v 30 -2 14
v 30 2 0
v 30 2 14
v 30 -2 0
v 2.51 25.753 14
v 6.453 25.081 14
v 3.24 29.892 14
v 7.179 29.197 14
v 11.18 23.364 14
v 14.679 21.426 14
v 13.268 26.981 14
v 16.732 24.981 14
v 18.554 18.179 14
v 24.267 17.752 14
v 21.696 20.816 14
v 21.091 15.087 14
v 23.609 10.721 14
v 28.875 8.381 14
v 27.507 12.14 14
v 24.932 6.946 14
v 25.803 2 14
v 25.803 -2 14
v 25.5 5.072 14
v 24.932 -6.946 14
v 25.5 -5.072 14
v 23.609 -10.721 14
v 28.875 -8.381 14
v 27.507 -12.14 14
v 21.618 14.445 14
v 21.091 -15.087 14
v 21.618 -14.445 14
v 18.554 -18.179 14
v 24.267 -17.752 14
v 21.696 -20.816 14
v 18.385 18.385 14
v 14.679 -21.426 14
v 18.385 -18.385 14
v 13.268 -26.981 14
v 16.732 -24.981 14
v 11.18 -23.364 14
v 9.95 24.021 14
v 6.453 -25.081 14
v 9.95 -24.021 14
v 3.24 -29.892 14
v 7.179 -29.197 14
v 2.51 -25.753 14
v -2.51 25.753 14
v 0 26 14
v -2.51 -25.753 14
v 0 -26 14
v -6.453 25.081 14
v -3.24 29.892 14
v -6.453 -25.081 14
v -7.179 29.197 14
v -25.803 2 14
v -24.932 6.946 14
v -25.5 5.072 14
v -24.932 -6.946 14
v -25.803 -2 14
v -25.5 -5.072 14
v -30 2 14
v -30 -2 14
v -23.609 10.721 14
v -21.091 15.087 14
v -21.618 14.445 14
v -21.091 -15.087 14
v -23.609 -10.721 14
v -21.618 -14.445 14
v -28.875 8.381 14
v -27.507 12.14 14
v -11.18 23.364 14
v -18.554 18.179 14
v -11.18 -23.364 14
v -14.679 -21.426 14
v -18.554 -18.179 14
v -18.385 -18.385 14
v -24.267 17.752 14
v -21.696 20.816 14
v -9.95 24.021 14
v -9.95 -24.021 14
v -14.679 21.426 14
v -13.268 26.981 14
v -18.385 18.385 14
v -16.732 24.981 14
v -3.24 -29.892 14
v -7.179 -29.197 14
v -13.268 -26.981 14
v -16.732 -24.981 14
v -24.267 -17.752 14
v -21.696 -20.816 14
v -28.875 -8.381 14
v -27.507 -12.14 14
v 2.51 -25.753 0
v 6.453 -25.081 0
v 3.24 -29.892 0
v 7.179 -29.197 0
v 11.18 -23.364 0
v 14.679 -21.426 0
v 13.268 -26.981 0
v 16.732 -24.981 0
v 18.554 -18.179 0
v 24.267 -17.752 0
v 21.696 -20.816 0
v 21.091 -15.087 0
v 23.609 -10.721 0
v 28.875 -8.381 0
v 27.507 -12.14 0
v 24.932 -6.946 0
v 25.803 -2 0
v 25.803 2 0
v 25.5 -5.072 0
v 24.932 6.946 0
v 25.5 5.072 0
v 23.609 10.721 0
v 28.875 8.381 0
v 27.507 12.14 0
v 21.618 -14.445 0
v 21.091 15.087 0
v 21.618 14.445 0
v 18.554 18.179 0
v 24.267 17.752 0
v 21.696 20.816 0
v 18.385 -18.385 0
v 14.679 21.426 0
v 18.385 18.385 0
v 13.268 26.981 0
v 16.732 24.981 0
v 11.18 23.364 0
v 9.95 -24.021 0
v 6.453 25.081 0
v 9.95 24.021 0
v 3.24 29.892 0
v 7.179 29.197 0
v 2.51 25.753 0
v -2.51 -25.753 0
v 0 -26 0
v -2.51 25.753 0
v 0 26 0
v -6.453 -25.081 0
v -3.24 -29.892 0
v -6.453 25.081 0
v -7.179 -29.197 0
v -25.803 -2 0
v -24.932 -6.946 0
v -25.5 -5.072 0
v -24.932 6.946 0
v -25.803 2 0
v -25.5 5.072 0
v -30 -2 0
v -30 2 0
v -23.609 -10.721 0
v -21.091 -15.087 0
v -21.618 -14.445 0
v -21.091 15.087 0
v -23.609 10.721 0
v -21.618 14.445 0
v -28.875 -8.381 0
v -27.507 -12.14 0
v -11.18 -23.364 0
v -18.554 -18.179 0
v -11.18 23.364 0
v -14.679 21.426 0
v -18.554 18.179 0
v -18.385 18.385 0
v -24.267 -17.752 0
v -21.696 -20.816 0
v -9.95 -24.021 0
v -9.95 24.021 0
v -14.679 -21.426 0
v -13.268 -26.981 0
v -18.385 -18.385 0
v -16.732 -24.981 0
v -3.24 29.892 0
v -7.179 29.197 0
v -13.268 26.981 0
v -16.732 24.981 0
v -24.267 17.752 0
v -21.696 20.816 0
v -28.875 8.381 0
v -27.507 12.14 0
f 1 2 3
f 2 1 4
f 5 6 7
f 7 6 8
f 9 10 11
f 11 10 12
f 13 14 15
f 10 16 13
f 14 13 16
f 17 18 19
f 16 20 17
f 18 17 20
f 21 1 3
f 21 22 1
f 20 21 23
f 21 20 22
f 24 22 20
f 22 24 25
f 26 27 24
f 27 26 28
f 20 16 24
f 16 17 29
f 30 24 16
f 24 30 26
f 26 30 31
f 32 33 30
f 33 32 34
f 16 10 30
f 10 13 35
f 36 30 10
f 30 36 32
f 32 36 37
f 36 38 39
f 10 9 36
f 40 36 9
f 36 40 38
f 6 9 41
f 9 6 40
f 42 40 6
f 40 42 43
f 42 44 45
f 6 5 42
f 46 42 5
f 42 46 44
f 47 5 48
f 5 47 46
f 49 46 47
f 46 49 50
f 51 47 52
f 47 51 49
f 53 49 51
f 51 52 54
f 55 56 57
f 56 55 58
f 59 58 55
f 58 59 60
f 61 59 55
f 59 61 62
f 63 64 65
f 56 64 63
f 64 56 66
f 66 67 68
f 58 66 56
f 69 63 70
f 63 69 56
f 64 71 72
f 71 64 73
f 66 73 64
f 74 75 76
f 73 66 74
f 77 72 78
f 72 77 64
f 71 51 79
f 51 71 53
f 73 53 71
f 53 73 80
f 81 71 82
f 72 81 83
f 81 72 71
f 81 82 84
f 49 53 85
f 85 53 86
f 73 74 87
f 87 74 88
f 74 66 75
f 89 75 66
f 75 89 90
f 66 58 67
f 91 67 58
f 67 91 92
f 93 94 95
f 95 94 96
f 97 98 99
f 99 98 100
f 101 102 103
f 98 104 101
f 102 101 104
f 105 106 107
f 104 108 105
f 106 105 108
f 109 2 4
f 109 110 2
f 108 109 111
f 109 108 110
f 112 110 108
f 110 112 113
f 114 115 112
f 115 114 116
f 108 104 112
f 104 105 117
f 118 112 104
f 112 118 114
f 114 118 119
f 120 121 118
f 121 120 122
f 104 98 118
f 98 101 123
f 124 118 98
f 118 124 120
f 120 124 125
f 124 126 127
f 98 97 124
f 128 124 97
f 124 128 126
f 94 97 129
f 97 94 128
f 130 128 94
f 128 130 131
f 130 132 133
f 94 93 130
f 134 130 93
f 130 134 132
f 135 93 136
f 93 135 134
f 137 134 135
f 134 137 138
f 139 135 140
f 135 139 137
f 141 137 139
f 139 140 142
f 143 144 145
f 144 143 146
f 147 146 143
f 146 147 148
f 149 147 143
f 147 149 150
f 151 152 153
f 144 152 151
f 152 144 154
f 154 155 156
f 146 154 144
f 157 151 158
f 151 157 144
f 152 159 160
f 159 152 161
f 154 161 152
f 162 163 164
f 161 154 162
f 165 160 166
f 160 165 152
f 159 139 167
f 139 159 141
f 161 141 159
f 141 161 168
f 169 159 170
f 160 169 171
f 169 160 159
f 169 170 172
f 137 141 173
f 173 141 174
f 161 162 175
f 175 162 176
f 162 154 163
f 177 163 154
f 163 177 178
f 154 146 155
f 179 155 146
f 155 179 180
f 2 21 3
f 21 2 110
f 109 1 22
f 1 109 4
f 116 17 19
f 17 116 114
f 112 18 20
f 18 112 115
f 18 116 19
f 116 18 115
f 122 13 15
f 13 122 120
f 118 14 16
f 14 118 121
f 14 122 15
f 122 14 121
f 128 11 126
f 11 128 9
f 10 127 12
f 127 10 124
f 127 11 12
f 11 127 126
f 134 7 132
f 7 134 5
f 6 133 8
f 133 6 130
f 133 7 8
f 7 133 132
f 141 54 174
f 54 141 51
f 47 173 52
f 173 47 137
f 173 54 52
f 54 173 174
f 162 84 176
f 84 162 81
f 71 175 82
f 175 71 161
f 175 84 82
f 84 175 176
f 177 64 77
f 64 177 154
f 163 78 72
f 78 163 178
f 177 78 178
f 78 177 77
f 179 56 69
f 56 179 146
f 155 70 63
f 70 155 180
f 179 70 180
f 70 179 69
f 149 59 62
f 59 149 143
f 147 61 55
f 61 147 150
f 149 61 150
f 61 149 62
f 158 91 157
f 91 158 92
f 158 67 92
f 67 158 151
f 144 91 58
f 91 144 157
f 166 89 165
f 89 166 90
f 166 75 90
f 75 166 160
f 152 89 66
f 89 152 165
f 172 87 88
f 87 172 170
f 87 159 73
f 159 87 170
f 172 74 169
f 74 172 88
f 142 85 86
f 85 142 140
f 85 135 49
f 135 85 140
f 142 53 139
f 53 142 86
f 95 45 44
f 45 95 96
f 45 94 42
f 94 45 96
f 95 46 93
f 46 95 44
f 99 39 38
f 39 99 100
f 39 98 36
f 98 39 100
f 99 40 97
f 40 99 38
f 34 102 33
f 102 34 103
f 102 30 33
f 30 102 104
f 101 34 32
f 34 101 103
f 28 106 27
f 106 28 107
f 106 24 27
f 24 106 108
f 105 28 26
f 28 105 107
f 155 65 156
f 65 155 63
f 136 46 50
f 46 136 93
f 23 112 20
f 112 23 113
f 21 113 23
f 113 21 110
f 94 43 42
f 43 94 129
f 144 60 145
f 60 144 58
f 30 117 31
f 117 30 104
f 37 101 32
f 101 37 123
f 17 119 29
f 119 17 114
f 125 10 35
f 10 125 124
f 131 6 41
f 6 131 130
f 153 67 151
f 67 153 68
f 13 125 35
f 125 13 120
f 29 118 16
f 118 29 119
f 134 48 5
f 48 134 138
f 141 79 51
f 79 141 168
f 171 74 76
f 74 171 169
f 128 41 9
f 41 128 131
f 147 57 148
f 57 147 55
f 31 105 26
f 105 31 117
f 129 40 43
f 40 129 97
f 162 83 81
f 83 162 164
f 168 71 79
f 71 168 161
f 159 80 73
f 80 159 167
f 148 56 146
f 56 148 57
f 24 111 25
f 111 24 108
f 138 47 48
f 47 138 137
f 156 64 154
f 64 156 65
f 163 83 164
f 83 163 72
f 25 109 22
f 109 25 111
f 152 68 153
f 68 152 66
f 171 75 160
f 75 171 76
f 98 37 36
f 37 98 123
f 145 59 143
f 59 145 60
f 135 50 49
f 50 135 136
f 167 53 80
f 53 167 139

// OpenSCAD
$fn = 32;

// ----------------------------------------------------------------------
// Spur blank: plain gear blank
// ----------------------------------------------------------------------

// --- parameters (mm) ---
disc_r = 26;              // blank root radius
disc_t = 14;              // blank thickness
n_teeth = 18;             // stub tooth count
tooth_w = 4;              // tooth width at the root
tooth_h = 4;              // tooth height above the root

out_r = disc_r + tooth_h;  // tip radius
bbox_x = 60.0;  // measured width over the teeth
bbox_y = 59.78;  // measured depth over the teeth

union() {
  cylinder(r = disc_r, h = disc_t);
  for (i = [0 : n_teeth - 1])
    rotate([0, 0, i * 360 / n_teeth])
      translate([disc_r - 1, -tooth_w / 2, 0])
        cube([tooth_h + 1, tooth_w, disc_t]);
}
